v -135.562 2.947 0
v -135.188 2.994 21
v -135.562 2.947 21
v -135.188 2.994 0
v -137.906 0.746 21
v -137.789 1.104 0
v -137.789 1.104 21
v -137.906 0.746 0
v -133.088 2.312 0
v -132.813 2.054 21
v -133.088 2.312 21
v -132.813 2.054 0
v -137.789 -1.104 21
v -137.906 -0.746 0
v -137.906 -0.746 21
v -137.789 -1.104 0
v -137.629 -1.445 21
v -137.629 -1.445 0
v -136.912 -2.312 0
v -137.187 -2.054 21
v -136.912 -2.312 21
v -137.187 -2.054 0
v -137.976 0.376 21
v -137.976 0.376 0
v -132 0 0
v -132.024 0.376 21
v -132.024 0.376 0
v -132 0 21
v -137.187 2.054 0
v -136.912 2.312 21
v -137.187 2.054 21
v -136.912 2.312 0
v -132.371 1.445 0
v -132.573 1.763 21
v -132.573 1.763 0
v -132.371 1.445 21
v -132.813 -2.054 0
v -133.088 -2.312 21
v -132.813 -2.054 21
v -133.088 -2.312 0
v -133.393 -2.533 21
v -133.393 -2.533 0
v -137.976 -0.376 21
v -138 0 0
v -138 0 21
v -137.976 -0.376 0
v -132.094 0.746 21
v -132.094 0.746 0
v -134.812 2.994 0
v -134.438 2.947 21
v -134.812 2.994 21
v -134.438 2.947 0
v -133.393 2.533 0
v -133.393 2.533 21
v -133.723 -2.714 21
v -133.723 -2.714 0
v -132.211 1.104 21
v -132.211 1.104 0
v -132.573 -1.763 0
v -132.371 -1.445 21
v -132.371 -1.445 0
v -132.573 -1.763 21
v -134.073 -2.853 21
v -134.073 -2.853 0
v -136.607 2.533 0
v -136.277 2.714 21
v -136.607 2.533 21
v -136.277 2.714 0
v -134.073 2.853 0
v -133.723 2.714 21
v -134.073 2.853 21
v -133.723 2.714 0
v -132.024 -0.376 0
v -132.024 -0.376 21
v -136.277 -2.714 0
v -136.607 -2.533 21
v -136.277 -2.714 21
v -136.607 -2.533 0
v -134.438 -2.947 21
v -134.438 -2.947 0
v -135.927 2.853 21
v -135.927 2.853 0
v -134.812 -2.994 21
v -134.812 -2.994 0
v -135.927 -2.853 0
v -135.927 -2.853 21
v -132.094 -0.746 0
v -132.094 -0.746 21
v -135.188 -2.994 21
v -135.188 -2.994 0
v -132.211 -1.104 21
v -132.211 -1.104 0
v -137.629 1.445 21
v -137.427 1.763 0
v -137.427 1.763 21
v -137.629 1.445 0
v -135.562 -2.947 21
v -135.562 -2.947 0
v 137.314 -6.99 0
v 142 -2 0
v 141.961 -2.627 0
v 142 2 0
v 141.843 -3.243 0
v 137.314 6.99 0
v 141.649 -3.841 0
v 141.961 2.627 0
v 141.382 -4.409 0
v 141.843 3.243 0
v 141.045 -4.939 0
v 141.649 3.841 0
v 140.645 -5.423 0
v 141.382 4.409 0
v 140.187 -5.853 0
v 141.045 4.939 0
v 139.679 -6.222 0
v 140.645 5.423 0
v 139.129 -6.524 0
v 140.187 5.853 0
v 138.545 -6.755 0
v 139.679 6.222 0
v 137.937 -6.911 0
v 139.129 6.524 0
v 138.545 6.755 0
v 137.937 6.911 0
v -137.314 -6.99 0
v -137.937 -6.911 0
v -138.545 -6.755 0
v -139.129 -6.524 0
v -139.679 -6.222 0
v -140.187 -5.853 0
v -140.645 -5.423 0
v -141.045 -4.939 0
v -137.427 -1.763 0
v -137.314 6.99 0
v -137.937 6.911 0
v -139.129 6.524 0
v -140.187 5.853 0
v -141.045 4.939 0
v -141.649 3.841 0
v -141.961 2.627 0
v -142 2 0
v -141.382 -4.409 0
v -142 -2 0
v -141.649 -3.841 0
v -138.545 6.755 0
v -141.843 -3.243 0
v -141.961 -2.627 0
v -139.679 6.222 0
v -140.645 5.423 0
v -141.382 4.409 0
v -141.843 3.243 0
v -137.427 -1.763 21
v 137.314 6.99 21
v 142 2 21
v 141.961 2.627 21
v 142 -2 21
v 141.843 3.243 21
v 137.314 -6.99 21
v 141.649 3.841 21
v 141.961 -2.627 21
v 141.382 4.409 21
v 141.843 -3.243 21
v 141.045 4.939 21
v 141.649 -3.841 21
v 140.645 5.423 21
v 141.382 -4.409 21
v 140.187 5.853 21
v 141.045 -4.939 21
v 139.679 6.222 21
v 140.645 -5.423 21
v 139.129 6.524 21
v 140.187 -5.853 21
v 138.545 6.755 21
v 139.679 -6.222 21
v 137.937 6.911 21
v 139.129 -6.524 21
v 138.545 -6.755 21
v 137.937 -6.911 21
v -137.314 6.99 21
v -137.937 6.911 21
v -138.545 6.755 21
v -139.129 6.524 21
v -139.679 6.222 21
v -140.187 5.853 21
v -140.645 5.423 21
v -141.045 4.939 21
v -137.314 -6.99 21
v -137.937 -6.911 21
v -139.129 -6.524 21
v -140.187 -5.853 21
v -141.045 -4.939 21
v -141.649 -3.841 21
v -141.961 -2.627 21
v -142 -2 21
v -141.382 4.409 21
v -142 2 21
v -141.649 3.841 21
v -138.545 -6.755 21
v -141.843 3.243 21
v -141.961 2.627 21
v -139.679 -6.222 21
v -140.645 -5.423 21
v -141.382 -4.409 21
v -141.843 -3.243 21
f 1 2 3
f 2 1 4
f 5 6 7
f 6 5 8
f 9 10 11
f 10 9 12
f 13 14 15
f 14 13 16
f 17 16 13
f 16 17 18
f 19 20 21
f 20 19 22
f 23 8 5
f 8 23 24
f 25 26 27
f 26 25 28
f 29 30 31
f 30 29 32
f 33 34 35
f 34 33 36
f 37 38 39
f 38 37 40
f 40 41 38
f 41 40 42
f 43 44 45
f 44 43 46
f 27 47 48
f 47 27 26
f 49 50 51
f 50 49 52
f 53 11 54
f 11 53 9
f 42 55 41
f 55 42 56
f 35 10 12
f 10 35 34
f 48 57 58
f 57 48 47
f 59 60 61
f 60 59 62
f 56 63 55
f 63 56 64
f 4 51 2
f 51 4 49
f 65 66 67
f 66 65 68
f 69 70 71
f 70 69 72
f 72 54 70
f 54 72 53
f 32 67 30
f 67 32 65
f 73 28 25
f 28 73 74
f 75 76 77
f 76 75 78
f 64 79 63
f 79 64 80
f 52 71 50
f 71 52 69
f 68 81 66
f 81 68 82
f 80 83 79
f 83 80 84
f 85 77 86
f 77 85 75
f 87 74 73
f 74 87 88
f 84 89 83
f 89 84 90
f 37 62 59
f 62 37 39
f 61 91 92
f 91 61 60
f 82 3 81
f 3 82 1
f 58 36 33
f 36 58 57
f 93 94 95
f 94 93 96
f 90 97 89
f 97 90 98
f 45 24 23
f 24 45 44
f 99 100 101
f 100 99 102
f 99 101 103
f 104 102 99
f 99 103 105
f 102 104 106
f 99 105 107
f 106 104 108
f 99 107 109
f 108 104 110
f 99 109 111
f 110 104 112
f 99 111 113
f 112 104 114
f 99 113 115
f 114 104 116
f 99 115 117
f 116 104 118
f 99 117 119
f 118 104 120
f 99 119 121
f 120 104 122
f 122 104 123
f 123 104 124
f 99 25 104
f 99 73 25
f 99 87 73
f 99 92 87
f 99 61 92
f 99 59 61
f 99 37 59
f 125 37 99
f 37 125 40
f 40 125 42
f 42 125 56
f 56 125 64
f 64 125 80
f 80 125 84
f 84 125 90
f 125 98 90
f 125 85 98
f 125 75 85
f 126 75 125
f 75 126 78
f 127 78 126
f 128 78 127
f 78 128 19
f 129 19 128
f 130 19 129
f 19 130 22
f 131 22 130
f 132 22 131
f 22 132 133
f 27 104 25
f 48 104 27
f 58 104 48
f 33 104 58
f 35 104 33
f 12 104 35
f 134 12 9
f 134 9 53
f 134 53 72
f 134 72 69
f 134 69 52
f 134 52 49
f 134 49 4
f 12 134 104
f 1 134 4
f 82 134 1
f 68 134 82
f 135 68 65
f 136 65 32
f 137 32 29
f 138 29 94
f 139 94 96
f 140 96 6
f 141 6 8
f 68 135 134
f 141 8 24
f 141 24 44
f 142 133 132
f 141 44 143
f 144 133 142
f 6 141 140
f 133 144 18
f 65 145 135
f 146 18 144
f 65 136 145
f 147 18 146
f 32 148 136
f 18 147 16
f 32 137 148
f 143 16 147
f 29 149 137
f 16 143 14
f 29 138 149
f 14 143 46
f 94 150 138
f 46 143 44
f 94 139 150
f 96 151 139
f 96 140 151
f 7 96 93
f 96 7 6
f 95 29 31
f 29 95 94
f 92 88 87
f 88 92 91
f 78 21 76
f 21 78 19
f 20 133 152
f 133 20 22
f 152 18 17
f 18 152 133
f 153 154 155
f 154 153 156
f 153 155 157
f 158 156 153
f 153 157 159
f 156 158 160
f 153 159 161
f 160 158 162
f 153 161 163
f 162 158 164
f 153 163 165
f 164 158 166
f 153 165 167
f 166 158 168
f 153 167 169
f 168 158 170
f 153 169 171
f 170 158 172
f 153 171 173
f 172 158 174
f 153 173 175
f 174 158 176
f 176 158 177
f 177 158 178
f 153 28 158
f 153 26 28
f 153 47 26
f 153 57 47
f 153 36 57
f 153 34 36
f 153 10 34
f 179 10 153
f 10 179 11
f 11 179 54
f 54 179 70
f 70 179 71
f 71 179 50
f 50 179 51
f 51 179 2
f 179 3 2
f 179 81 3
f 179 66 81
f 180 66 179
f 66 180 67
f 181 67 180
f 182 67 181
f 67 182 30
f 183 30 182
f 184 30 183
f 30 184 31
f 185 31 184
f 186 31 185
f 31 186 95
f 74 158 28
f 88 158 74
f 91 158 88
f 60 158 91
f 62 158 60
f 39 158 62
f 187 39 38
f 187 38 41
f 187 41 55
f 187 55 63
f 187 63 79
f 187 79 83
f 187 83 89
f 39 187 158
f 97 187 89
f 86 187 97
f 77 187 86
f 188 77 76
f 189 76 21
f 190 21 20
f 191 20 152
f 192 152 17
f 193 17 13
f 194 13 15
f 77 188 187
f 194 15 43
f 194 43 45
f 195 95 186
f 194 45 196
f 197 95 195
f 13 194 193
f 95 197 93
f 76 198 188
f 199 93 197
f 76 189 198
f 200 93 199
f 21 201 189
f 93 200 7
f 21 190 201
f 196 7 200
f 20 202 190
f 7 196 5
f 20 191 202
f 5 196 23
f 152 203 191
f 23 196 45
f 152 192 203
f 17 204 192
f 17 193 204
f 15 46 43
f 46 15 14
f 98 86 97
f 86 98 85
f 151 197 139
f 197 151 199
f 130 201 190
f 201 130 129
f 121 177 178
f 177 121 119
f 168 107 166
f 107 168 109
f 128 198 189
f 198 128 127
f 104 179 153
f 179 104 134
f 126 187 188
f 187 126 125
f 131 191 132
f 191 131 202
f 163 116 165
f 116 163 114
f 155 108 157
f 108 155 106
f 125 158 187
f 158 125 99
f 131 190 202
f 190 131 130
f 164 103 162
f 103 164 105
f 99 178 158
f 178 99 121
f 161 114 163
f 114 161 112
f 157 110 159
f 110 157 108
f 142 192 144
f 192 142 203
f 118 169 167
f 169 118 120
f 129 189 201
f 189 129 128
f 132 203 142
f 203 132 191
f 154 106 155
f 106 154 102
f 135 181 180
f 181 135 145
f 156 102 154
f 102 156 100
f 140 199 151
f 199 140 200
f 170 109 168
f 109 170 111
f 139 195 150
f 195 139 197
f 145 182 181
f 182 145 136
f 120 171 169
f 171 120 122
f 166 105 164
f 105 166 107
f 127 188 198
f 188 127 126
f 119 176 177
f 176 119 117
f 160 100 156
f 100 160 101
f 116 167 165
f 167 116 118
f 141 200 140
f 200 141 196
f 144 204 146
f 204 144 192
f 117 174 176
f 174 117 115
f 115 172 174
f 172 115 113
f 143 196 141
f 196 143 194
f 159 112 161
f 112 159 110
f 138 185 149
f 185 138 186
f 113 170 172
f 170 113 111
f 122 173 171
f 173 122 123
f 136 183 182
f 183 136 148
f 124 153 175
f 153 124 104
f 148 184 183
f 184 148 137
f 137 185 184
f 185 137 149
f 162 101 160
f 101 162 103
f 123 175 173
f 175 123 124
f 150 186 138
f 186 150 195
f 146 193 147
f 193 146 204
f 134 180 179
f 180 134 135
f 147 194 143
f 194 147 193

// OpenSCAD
$fn = 50;


difference() {
	union() {
		hull() {
			translate(v = [-137.0000000000, 2.0000000000, 0]) {
				cylinder(h = 21, r = 5);
			}
			translate(v = [137.0000000000, 2.0000000000, 0]) {
				cylinder(h = 21, r = 5);
			}
			translate(v = [-137.0000000000, -2.0000000000, 0]) {
				cylinder(h = 21, r = 5);
			}
			translate(v = [137.0000000000, -2.0000000000, 0]) {
				cylinder(h = 21, r = 5);
			}
		}
	}
	union() {
		translate(v = [-135.0000000000, 0.0000000000, 0]) {
			cylinder(h = 21, r = 3.0000000000);
		}
		translate(v = [-135.0000000000, 0.0000000000, 0]) {
			cylinder(h = 21, r = 1.5000000000);
		}
		translate(v = [-135.0000000000, 0.0000000000, 0]) {
			cylinder(h = 21, r = 1.5000000000);
		}
		translate(v = [-135.0000000000, 0.0000000000, 0]) {
			cylinder(h = 21, r = 1.5000000000);
		}
	}
}
